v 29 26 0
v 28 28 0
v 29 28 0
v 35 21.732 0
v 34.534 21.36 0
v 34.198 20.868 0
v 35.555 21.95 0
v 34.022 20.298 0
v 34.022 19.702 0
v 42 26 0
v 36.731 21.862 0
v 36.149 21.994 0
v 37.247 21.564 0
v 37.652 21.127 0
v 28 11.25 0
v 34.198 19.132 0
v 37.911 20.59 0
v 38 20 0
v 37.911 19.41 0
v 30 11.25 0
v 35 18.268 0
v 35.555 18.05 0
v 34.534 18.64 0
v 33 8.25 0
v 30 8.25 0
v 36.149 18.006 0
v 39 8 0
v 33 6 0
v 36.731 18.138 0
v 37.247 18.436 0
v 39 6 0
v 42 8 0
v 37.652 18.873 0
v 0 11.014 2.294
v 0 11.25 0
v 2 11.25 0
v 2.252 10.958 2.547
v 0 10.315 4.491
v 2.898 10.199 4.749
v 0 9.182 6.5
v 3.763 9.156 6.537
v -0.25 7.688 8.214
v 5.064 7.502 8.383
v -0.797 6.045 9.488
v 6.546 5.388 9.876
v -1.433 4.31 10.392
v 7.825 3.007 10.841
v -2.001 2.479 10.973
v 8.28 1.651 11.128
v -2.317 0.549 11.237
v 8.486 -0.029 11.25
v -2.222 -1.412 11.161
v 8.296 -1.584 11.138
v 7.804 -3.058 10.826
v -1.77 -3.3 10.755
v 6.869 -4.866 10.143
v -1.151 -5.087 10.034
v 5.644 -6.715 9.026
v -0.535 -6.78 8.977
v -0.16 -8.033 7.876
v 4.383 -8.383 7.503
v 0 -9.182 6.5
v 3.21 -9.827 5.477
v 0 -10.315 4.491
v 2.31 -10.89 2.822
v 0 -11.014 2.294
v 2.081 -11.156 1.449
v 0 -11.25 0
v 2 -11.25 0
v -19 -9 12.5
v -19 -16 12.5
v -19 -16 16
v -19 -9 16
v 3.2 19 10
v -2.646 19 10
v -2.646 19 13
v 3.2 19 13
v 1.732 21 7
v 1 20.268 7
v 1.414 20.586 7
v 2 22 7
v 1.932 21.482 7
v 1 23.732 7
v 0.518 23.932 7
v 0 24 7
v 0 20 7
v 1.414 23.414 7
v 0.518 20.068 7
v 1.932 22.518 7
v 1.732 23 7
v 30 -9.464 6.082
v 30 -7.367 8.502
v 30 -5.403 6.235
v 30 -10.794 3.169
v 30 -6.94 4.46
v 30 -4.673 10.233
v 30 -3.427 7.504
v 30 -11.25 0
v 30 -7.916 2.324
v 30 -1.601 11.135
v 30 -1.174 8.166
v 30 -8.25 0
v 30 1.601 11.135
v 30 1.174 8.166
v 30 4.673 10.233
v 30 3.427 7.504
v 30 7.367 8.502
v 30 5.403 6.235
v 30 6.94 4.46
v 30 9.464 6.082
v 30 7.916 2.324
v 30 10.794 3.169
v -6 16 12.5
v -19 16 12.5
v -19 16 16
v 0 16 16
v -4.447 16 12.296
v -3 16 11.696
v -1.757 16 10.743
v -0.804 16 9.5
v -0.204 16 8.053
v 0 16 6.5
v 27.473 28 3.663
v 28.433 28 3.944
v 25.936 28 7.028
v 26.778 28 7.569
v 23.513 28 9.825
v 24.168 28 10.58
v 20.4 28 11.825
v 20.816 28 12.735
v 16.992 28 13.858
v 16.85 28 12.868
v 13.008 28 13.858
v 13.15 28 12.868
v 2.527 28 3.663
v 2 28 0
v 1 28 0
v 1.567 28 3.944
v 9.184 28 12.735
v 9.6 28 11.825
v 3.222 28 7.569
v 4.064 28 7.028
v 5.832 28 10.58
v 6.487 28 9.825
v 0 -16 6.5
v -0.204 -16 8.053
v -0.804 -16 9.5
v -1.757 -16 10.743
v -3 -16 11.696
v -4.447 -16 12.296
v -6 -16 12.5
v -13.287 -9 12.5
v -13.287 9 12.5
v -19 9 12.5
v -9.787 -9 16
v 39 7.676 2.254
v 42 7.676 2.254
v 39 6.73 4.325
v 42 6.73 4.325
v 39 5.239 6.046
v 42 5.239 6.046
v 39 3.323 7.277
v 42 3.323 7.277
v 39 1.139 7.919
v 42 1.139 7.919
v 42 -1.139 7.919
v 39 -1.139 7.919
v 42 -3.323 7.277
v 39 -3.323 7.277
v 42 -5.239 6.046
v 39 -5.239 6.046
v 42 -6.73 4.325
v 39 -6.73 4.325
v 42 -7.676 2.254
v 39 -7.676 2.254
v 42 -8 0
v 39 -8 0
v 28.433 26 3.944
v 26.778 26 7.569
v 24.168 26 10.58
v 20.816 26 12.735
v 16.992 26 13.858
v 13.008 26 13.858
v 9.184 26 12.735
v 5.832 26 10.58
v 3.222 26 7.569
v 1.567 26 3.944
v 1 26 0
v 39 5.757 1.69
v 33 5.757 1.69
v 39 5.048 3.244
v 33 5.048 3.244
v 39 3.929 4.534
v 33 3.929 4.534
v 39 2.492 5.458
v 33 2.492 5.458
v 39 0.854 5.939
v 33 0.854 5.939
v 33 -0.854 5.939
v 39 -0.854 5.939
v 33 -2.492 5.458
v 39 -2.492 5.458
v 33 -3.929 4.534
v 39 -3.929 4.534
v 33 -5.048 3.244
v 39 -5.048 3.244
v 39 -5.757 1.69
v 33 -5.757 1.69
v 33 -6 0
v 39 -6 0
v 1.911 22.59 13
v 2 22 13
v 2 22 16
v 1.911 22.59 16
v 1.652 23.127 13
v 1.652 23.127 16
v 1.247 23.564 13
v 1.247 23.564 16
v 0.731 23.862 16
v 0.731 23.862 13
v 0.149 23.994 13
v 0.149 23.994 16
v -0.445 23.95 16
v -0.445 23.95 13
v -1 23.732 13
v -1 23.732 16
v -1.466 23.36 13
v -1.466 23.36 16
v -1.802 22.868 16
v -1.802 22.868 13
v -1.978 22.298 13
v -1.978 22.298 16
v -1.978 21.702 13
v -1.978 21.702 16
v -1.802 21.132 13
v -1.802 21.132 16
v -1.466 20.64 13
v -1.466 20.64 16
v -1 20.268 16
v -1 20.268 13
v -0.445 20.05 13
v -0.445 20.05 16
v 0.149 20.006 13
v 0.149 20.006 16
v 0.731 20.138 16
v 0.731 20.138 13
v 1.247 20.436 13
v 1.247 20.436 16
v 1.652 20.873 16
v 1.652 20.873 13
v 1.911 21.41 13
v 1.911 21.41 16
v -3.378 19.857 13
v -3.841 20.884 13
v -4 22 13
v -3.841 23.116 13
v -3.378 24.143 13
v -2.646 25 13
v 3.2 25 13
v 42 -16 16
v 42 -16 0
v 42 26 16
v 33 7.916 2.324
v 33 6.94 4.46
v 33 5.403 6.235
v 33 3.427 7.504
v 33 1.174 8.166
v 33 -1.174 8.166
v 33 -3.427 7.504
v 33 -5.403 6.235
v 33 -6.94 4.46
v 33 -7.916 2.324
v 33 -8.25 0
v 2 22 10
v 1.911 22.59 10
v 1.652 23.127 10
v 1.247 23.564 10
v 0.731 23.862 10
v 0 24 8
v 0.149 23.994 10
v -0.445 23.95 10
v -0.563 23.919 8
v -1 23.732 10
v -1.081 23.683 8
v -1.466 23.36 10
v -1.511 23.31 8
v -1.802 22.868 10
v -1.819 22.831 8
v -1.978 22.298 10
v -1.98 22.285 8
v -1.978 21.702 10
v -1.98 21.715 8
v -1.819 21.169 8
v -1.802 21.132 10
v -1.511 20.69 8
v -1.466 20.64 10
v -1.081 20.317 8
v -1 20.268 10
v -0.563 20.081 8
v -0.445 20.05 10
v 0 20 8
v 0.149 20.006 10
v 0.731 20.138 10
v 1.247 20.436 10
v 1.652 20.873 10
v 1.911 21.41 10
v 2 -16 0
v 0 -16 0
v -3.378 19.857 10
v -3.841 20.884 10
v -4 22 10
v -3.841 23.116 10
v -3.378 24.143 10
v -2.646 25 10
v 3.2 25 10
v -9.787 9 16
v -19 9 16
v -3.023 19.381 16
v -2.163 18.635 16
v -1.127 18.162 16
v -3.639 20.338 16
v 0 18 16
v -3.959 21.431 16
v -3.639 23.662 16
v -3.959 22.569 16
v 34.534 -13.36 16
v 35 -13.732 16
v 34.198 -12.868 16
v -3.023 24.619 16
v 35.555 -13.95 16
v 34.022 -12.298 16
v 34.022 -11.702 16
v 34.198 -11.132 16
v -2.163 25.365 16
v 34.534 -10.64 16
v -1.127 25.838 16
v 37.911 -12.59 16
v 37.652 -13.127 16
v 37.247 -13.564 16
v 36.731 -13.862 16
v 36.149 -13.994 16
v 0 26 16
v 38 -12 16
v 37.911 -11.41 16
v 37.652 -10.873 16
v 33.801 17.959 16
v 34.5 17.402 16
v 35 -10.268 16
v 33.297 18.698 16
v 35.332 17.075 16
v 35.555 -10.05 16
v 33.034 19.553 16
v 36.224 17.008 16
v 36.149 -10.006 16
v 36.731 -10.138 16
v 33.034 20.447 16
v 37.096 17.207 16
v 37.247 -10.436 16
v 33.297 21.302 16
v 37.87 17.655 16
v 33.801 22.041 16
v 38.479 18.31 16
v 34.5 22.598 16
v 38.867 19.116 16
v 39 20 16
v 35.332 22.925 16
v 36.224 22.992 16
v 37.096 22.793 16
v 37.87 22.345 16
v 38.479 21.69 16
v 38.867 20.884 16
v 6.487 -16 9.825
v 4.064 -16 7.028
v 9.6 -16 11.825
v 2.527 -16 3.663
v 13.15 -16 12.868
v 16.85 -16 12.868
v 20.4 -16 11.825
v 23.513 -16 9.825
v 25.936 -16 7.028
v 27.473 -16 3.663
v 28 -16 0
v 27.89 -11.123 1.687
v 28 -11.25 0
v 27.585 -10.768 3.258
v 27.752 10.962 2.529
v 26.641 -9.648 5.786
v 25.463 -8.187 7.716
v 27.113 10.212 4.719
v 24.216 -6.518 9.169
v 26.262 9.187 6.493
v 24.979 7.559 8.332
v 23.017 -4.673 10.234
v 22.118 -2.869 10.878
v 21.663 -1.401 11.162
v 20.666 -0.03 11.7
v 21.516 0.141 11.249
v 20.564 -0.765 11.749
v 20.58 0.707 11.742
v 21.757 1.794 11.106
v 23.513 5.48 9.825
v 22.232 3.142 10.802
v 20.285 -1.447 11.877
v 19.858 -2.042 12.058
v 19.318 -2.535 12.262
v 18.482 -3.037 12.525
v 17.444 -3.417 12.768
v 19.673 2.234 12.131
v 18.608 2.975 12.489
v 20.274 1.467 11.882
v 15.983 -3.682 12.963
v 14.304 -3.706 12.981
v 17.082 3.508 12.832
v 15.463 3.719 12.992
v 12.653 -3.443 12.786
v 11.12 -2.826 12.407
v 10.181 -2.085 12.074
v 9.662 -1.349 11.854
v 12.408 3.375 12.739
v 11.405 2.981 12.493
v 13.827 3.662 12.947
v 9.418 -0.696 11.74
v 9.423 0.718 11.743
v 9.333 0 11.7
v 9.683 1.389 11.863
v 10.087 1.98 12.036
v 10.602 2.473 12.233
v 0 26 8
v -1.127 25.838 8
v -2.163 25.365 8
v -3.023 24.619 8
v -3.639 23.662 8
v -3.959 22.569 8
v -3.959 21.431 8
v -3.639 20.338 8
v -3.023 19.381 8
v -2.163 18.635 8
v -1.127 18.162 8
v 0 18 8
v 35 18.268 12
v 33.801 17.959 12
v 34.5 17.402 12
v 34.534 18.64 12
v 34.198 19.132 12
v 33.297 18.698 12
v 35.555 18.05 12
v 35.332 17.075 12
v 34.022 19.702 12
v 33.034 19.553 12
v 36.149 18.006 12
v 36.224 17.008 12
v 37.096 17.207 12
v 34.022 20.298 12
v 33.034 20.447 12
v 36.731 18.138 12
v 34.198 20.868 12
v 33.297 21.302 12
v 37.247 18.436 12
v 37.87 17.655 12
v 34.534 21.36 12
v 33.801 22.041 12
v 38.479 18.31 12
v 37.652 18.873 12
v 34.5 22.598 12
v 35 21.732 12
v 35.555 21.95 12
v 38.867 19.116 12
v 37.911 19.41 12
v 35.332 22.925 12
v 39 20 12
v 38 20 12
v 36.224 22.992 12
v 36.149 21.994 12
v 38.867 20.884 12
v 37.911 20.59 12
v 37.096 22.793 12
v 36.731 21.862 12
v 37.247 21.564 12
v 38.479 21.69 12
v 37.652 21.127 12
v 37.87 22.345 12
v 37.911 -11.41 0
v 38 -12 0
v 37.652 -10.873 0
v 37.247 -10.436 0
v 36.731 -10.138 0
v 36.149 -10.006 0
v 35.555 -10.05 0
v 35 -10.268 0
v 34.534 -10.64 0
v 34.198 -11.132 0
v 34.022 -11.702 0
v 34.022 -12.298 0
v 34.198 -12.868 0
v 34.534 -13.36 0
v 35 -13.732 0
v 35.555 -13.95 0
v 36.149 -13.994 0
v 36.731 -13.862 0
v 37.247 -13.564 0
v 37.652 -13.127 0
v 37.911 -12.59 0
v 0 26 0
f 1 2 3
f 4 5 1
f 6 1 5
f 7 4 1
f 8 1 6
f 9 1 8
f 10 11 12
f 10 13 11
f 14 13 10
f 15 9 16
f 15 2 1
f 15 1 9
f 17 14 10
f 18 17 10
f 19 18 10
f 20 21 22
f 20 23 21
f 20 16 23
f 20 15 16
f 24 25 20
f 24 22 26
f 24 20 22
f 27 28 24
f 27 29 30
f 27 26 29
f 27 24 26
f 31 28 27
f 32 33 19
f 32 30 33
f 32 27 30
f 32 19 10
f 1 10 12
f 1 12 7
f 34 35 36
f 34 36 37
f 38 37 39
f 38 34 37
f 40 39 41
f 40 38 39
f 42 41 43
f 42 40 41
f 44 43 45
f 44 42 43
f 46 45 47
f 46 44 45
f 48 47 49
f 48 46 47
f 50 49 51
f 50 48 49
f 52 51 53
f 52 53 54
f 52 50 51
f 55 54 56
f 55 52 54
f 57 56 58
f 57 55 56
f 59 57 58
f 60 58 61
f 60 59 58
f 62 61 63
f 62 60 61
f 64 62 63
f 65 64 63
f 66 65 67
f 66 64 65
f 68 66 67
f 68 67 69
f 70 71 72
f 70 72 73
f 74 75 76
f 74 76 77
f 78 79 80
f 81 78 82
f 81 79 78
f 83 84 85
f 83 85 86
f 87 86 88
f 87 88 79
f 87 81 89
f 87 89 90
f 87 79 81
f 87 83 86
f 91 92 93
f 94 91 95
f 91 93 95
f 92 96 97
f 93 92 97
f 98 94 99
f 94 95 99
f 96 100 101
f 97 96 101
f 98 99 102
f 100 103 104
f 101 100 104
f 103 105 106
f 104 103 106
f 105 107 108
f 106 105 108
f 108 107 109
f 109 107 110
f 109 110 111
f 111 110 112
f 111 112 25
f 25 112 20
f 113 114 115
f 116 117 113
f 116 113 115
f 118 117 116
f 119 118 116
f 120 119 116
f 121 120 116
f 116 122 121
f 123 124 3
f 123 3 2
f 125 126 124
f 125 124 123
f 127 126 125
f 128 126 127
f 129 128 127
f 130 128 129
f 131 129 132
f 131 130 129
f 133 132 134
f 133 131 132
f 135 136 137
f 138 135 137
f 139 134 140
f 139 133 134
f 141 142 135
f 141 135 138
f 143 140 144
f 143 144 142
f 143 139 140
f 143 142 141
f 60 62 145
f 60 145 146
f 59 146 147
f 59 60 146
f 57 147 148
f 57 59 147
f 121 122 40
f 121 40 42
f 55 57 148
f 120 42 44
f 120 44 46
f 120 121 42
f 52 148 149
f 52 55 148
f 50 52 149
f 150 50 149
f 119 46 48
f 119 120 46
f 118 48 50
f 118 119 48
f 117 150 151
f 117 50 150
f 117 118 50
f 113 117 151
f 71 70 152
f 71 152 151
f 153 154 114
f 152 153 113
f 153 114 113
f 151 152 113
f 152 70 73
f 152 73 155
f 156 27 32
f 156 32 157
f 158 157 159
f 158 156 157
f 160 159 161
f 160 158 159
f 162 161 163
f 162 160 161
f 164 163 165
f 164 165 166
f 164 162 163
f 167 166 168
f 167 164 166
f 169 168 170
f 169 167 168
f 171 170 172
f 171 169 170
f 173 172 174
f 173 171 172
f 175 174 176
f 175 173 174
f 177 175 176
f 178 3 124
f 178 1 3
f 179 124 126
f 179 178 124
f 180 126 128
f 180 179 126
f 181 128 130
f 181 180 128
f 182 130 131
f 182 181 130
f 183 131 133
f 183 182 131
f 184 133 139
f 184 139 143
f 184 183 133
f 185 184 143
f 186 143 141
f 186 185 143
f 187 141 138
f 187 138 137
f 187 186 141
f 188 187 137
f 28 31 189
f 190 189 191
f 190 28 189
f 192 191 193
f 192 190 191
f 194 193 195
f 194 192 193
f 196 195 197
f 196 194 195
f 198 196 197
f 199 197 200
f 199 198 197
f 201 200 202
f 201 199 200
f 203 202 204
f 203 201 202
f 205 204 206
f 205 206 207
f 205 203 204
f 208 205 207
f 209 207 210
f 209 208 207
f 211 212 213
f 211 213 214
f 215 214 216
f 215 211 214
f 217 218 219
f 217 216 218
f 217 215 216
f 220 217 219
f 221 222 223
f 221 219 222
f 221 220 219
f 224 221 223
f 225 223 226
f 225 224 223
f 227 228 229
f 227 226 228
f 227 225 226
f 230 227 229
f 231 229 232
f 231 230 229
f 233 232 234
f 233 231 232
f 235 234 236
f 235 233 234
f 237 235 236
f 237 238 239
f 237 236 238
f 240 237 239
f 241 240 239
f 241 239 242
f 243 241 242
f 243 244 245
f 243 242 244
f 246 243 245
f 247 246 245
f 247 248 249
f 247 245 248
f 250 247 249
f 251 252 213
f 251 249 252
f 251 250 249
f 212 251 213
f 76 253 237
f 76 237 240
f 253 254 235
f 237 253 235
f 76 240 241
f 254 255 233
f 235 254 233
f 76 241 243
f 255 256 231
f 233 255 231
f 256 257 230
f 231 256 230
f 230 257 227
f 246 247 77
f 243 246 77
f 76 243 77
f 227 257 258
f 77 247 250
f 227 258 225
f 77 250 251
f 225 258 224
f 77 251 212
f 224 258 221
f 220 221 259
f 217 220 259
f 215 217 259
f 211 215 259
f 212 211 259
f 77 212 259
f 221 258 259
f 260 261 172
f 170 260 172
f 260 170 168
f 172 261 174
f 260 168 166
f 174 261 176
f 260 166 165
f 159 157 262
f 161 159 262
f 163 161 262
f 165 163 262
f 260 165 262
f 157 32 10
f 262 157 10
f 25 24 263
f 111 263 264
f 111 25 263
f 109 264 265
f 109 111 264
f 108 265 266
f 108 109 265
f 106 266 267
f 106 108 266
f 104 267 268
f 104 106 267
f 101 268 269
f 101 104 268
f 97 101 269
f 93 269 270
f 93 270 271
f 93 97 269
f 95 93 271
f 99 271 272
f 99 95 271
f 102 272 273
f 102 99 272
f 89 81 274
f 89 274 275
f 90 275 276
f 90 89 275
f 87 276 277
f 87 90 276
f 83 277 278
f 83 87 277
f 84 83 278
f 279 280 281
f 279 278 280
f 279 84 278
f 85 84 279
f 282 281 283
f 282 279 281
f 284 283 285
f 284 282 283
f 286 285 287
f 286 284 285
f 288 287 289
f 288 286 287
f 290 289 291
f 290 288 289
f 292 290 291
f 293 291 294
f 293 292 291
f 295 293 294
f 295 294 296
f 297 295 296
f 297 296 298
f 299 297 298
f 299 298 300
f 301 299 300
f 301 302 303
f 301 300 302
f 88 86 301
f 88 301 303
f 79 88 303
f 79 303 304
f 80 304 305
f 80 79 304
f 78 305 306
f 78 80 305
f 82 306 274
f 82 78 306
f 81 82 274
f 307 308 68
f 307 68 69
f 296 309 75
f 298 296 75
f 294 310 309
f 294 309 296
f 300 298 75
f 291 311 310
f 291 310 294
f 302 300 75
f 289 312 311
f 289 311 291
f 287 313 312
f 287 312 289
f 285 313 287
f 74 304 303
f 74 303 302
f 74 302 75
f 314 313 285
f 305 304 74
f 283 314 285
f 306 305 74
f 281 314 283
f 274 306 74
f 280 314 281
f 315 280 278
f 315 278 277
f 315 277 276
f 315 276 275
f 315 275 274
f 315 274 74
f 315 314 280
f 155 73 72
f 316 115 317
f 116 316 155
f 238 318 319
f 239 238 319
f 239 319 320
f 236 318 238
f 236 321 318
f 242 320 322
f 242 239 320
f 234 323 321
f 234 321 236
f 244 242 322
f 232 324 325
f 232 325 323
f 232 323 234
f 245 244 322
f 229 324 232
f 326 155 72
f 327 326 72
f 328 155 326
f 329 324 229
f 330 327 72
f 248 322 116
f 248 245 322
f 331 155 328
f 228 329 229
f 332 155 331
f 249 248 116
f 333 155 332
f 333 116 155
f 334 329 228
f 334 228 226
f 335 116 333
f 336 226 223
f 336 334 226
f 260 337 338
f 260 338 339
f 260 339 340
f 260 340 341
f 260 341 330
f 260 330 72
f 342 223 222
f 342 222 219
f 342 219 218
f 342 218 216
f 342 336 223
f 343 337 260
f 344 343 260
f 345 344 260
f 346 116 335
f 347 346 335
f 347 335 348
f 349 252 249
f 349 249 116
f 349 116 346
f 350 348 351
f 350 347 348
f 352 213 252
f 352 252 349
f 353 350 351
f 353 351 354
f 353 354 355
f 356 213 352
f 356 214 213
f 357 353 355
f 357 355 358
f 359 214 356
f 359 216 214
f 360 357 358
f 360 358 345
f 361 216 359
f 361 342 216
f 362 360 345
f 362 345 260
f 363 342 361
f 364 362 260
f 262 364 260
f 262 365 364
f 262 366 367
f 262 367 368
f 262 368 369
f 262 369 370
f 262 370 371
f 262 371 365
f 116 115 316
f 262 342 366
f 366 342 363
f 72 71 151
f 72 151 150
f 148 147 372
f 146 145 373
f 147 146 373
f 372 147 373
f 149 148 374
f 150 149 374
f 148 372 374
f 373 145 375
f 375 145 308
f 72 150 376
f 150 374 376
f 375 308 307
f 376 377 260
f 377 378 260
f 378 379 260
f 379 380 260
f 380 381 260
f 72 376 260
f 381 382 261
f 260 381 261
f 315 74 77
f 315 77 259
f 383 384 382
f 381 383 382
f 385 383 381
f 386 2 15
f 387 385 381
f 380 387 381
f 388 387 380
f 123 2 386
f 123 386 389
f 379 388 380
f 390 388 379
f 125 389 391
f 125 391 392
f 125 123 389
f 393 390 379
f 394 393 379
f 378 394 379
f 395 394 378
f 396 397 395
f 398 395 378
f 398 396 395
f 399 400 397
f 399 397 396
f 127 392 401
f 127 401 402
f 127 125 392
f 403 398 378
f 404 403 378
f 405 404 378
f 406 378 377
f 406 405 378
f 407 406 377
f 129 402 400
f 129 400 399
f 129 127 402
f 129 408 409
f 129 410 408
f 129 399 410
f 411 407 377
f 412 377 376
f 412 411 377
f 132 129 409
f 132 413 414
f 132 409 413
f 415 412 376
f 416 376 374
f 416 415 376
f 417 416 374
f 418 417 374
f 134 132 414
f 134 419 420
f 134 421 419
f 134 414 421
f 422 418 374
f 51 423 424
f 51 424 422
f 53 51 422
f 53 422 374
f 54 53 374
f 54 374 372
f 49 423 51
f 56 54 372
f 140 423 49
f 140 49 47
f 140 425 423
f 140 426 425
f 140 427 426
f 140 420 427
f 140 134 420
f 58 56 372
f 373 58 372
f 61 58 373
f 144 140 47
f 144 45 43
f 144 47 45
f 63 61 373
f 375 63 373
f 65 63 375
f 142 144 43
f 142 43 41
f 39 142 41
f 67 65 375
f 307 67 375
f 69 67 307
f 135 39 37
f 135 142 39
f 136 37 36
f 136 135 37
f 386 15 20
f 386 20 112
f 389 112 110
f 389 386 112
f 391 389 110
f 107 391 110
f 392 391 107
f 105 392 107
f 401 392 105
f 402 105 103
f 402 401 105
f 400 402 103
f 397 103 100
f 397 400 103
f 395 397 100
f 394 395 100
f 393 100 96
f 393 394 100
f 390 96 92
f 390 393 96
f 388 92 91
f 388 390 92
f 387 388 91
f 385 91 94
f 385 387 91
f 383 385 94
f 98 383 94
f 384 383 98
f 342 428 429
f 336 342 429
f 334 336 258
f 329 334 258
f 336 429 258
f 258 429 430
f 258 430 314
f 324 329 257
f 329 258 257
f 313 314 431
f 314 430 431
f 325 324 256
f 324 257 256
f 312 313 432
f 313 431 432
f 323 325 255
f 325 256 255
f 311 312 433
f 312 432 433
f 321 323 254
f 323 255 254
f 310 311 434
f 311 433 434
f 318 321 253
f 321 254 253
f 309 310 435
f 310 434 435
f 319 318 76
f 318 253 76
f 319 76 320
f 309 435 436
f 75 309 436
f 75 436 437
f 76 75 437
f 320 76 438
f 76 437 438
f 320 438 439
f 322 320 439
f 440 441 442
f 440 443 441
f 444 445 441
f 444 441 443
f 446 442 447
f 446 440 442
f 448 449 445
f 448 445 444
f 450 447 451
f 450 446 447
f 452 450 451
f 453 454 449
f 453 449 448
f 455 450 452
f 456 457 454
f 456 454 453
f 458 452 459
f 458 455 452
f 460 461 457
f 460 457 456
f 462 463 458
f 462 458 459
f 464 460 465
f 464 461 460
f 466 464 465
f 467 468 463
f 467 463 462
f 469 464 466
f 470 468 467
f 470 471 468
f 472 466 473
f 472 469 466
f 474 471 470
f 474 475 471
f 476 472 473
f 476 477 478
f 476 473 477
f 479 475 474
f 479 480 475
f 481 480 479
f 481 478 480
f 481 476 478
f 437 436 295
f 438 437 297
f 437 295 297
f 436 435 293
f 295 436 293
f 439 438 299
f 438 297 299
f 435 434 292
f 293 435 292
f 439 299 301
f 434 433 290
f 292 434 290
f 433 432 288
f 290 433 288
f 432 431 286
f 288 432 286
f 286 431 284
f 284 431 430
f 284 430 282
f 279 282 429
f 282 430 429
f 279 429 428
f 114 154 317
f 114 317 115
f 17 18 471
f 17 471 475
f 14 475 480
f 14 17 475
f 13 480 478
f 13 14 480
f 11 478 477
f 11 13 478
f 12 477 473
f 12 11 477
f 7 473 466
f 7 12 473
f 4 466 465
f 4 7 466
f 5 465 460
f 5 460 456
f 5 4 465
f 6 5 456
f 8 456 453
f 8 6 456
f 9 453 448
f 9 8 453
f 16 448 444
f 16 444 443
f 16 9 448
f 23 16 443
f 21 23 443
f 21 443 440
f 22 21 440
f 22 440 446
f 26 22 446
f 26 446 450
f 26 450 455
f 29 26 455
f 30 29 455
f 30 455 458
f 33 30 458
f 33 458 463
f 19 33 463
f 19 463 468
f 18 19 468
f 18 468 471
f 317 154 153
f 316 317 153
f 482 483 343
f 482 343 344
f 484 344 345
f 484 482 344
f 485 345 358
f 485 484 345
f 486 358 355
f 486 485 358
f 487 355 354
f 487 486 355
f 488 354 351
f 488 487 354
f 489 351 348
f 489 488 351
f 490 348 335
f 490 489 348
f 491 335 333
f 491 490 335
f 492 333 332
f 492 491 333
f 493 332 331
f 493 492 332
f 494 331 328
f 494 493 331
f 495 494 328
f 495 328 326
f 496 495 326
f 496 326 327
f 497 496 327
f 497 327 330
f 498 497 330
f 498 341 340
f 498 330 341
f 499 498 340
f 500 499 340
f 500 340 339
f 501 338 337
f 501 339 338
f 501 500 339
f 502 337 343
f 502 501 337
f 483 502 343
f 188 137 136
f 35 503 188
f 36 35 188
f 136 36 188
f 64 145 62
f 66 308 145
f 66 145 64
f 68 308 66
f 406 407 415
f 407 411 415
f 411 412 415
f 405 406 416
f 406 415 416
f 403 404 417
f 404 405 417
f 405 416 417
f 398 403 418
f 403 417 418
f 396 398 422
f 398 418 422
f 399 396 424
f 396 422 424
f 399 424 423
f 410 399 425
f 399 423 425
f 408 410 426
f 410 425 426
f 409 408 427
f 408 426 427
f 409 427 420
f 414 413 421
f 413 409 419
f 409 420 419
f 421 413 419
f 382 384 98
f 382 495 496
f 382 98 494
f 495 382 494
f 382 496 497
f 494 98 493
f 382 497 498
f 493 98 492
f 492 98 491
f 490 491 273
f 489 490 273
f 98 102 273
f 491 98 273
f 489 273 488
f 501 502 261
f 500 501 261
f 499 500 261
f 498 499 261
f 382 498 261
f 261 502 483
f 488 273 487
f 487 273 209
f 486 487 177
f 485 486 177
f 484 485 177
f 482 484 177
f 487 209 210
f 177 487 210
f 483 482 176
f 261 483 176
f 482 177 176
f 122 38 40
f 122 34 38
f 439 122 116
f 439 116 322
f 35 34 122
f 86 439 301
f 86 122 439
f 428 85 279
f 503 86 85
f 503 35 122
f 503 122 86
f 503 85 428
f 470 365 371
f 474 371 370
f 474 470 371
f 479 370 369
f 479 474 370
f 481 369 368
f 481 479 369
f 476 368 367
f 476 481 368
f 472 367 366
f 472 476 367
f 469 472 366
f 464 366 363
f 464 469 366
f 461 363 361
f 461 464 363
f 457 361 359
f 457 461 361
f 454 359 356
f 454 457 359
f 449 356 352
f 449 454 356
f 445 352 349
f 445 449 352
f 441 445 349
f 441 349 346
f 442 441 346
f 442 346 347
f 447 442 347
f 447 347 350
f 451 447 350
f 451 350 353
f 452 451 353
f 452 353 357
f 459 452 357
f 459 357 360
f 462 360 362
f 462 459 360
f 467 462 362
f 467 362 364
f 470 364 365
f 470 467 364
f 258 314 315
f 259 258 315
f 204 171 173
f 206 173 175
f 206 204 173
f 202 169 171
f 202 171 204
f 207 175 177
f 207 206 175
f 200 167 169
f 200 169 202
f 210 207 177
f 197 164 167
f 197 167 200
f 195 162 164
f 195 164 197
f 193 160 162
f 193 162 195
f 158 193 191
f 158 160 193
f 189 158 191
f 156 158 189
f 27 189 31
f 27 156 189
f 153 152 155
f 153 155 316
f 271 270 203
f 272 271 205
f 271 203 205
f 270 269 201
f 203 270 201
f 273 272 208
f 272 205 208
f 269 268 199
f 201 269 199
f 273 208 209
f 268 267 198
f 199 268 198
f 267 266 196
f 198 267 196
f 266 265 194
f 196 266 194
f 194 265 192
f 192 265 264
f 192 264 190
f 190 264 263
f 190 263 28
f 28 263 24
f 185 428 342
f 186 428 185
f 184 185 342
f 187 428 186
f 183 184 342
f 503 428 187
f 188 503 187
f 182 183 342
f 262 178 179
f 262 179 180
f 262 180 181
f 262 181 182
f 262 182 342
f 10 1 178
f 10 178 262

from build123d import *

# Parameters (mm, degrees)
CYLINDER076_R           = 13
CYLINDER076_DEPTH       = 2.2
CYLINDER076_ROLL_ANGLE  = 90
CYLINDER075_W           = 14
CYLINDER075_H           = 2
CYLINDER075_ANGLE       = 180
CYLINDER075_ROLL_ANGLE  = 90
CYLINDER029_R           = 6
CYLINDER029_DEPTH       = 20
CYLINDER029_PITCH_ANGLE = 90
CYLINDER030_R           = 6
CYLINDER030_DEPTH       = 20
CYLINDER030_PITCH_ANGLE = 90
CYLINDER028_R           = 13
CYLINDER028_DEPTH       = 50
CYLINDER028_ROLL_ANGLE  = 90
CYLINDER027_R           = 8
CYLINDER027_DEPTH       = 3
CYLINDER027_PITCH_ANGLE = 90
CYLINDER026_R           = 6
CYLINDER026_DEPTH       = 39
CYLINDER026_PITCH_ANGLE = 90
CYLINDER025_R           = 8.25
CYLINDER025_DEPTH       = 33
CYLINDER025_PITCH_ANGLE = 90
CYLINDER024_R           = 11.25
CYLINDER024_DEPTH       = 36
CYLINDER024_PITCH_ANGLE = 90
BOX009_W                = 10
BOX009_H                = 6
BOX009_DEPTH            = 2.7
CYLINDER023_R           = 3
CYLINDER023_DEPTH       = 11
CYLINDER022_R           = 2
CYLINDER022_DEPTH       = 29
BOX008_W                = 10
BOX008_H                = 6
BOX008_DEPTH            = 2.7
CYLINDER021_R           = 3
CYLINDER021_DEPTH       = 11
CYLINDER020_R           = 2
CYLINDER020_DEPTH       = 22
BOX017_W                = 15
BOX017_H                = 6
BOX017_DEPTH            = 3
CYLINDER056_R           = 1.5
CYLINDER056_DEPTH       = 25
CYLINDER055_R           = 2
CYLINDER055_DEPTH       = 32
CYLINDER046_R           = 5
CYLINDER046_DEPTH       = 2.2
CYLINDER046_ROLL_ANGLE  = 90
BOX005_W                = 15
BOX005_H                = 18
BOX005_DEPTH            = 15
BOX005_PITCH_ANGLE      = 45
CYLINDER015_R           = 6
CYLINDER015_DEPTH       = 32
CYLINDER015_ROLL_ANGLE  = 90
BOX004_W                = 6
BOX004_H                = 32
BOX004_DEPTH            = 6
BOX003_W                = 19
BOX003_H                = 32
BOX003_DEPTH            = 3.5
BOX001_W                = 42
BOX001_H                = 42
BOX001_DEPTH            = 16
CYLINDER047_R           = 4
CYLINDER047_DEPTH       = 8


with BuildPart() as fanmuffeinner001:
    # Cylinder076 → Cylinder076 (new body)
    with BuildSketch(Plane.XY):
        Circle(CYLINDER076_R)
    extrude(amount=CYLINDER076_DEPTH)


with BuildPart() as fanmuffeinner001_1:
    # Cylinder076 roll: moved
    add(fanmuffeinner001.part.rotate(Axis((0, 0, 0), (1, 0, 0)), CYLINDER076_ROLL_ANGLE))


with BuildPart() as fanmuffeinner001_2:
    # Cylinder076 placement: moved
    add(fanmuffeinner001_1.part.moved(Location((15, 29, 0))))


with BuildPart() as fancouplering_oberschale:
    # Cylinder075 → Cylinder075 (revolve)
    with BuildSketch(Plane.XZ):
        with Locations((7, 1)):
            Rectangle(CYLINDER075_W, CYLINDER075_H)
    revolve(axis=Axis((0, 0, 0), (0, 0, 1)), revolution_arc=CYLINDER075_ANGLE)


with BuildPart() as fancouplering_oberschale_1:
    # Cylinder075 roll: moved
    add(fancouplering_oberschale.part.rotate(Axis((0, 0, 0), (1, 0, 0)), CYLINDER075_ROLL_ANGLE))


with BuildPart() as fancouplering_oberschale_2:
    # Cylinder075 placement: moved
    add(fancouplering_oberschale_1.part.moved(Location((15, 29, 0))))

    # Cut010005: cut FanMuffeInner001
    add(fanmuffeinner001_2.part, mode=Mode.SUBTRACT)


with BuildPart() as fancouplering_oberschale_3:
    # Cut010005 placement: moved
    add(fancouplering_oberschale_2.part.moved(Location((0, -1, 0))))


with BuildPart() as cylinder029:
    # Cylinder029 → Cylinder029 (new body)
    with BuildSketch(Plane.XY):
        Circle(CYLINDER029_R)
    extrude(amount=CYLINDER029_DEPTH)


with BuildPart() as cylinder029_1:
    # Cylinder029 pitch: moved
    add(cylinder029.part.rotate(Axis((0, 0, 0), (0, 1, 0)), CYLINDER029_PITCH_ANGLE))


with BuildPart() as cylinder029_2:
    # Cylinder029 placement: moved
    add(cylinder029_1.part.moved(Location((5, 0, 17.7))))


with BuildPart() as fusion019:
    # Cylinder030 → Cylinder030 (new body)
    with BuildSketch(Plane.XY):
        Circle(CYLINDER030_R)
    extrude(amount=CYLINDER030_DEPTH)


with BuildPart() as fusion019_1:
    # Cylinder030 pitch: moved
    add(fusion019.part.rotate(Axis((0, 0, 0), (0, 1, 0)), CYLINDER030_PITCH_ANGLE))


with BuildPart() as fusion019_2:
    # Cylinder030 placement: moved
    add(fusion019_1.part.moved(Location((5, 0, -17.7))))

    # Fusion019: union Cylinder029
    add(cylinder029_2.part)


with BuildPart() as cut003:
    # Cylinder028 → Cylinder028 (new body)
    with BuildSketch(Plane.XY):
        Circle(CYLINDER028_R)
    extrude(amount=CYLINDER028_DEPTH)


with BuildPart() as cut003_1:
    # Cylinder028 roll: moved
    add(cut003.part.rotate(Axis((0, 0, 0), (1, 0, 0)), CYLINDER028_ROLL_ANGLE))


with BuildPart() as cut003_2:
    # Cylinder028 placement: moved
    add(cut003_1.part.moved(Location((15, 29, 0))))

    # Cut003: cut Fusion019
    add(fusion019_2.part, mode=Mode.SUBTRACT)


with BuildPart() as cylinder027:
    # Cylinder027 → Cylinder027 (new body)
    with BuildSketch(Plane.XY):
        Circle(CYLINDER027_R)
    extrude(amount=CYLINDER027_DEPTH)


with BuildPart() as cylinder027_1:
    # Cylinder027 pitch: moved
    add(cylinder027.part.rotate(Axis((0, 0, 0), (0, 1, 0)), CYLINDER027_PITCH_ANGLE))


with BuildPart() as cylinder027_2:
    # Cylinder027 placement: moved
    add(cylinder027_1.part.moved(Location((39, 0, 0))))


with BuildPart() as cylinder026:
    # Cylinder026 → Cylinder026 (new body)
    with BuildSketch(Plane.XY):
        Circle(CYLINDER026_R)
    extrude(amount=CYLINDER026_DEPTH)


with BuildPart() as cylinder026_1:
    # Cylinder026 pitch: moved
    add(cylinder026.part.rotate(Axis((0, 0, 0), (0, 1, 0)), CYLINDER026_PITCH_ANGLE))


with BuildPart() as cylinder026_2:
    # Cylinder026 placement: moved
    add(cylinder026_1.part)


with BuildPart() as cylinder025:
    # Cylinder025 → Cylinder025 (new body)
    with BuildSketch(Plane.XY):
        Circle(CYLINDER025_R)
    extrude(amount=CYLINDER025_DEPTH)


with BuildPart() as cylinder025_1:
    # Cylinder025 pitch: moved
    add(cylinder025.part.rotate(Axis((0, 0, 0), (0, 1, 0)), CYLINDER025_PITCH_ANGLE))


with BuildPart() as cylinder025_2:
    # Cylinder025 placement: moved
    add(cylinder025_1.part)


with BuildPart() as coldendcutairflow_oberschale:
    # Cylinder024 → Cylinder024 (new body)
    with BuildSketch(Plane.XY):
        Circle(CYLINDER024_R)
    extrude(amount=CYLINDER024_DEPTH)


with BuildPart() as coldendcutairflow_oberschale_1:
    # Cylinder024 pitch: moved
    add(coldendcutairflow_oberschale.part.rotate(Axis((0, 0, 0), (0, 1, 0)), CYLINDER024_PITCH_ANGLE))


with BuildPart() as coldendcutairflow_oberschale_2:
    # Cylinder024 placement: moved
    add(coldendcutairflow_oberschale_1.part.moved(Location((-6, 0, 0))))

    # Fusion020: union Cut003, Cylinder027, Cylinder026, Cylinder025
    add(cut003_2.part)
    add(cylinder027_2.part)
    add(cylinder026_2.part)
    add(cylinder025_2.part)


with BuildPart() as cube006:
    # Box009 → Box009 (new body)
    with BuildSketch(Plane(origin=(41.8, 14, -7.5), x_dir=(1, 0, 0), z_dir=(0, 0, 1))):
        with Locations((5, 3)):
            Rectangle(BOX009_W, BOX009_H)
    extrude(amount=BOX009_DEPTH)


with BuildPart() as cylinder023:
    # Cylinder023 → Cylinder023 (new body)
    with BuildSketch(Plane(origin=(45, 21, -6), x_dir=(1, 0, 0), z_dir=(0, 0, 1))):
        Circle(CYLINDER023_R)
    extrude(amount=CYLINDER023_DEPTH)


with BuildPart() as fusion017:
    # Cylinder022 → Cylinder022 (new body)
    with BuildSketch(Plane(origin=(45, 21, -34), x_dir=(1, 0, 0), z_dir=(0, 0, 1))):
        Circle(CYLINDER022_R)
    extrude(amount=CYLINDER022_DEPTH)

    # Fusion016: union Cylinder023
    add(cylinder023.part)


with BuildPart() as fusion017_1:
    # Fusion016 placement: moved
    add(fusion017.part.moved(Location((0, -4, 24))))

    # Fusion017: union Cube006
    add(cube006.part)


with BuildPart() as fusion017_2:
    # Fusion017 placement: moved
    add(fusion017_1.part.moved(Location((-9, -29, 0))))


with BuildPart() as cube005:
    # Box008 → Box008 (new body)
    with BuildSketch(Plane(origin=(41.8, 14, -7.5), x_dir=(1, 0, 0), z_dir=(0, 0, 1))):
        with Locations((5, 3)):
            Rectangle(BOX008_W, BOX008_H)
    extrude(amount=BOX008_DEPTH)


with BuildPart() as cylinder021:
    # Cylinder021 → Cylinder021 (new body)
    with BuildSketch(Plane(origin=(45, 21, -12), x_dir=(1, 0, 0), z_dir=(0, 0, 1))):
        Circle(CYLINDER021_R)
    extrude(amount=CYLINDER021_DEPTH)


with BuildPart() as schalenbohrung_oberschale:
    # Cylinder020 → Cylinder020 (new body)
    with BuildSketch(Plane(origin=(45, 21, -34), x_dir=(1, 0, 0), z_dir=(0, 0, 1))):
        Circle(CYLINDER020_R)
    extrude(amount=CYLINDER020_DEPTH)

    # Fusion014: union Cylinder021
    add(cylinder021.part)


with BuildPart() as schalenbohrung_oberschale_1:
    # Fusion014 placement: moved
    add(schalenbohrung_oberschale.part.moved(Location((0, -4, 24))))

    # Fusion015: union Cube005
    add(cube005.part)


with BuildPart() as schalenbohrung_oberschale_2:
    # Fusion015 placement: moved
    add(schalenbohrung_oberschale_1.part.moved(Location((-9, 3, 0))))

    # Fusion018: union Fusion017
    add(fusion017_2.part)


with BuildPart() as cube014:
    # Box017 → Box017 (new body)
    with BuildSketch(Plane(origin=(58.2, 67, 3), x_dir=(1, 0, 0), z_dir=(0, 0, 1))):
        with Locations((7.5, 3)):
            Rectangle(BOX017_W, BOX017_H)
    extrude(amount=BOX017_DEPTH)


with BuildPart() as cylinder056:
    # Cylinder056 → Cylinder056 (new body)
    with BuildSketch(Plane(origin=(70, 70, 7), x_dir=(1, 0, 0), z_dir=(0, 0, 1))):
        Circle(CYLINDER056_R)
    extrude(amount=CYLINDER056_DEPTH)


with BuildPart() as bohrungafanduct_oberschale:
    # Cylinder055 → Cylinder055 (new body)
    with BuildSketch(Plane(origin=(70, 70, 0), x_dir=(1, 0, 0), z_dir=(0, 0, 1))):
        Circle(CYLINDER055_R)
    extrude(amount=CYLINDER055_DEPTH)

    # Fusion040: union Cube014, Cylinder056
    add(cube014.part)
    add(cylinder056.part)


with BuildPart() as bohrungafanduct_oberschale_1:
    # Fusion040 placement: moved
    add(bohrungafanduct_oberschale.part.moved(Location((-70, -48, 7))))


with BuildPart() as bohrungoberschale:
    # Cylinder046 → Cylinder046 (new body)
    with BuildSketch(Plane.XY):
        Circle(CYLINDER046_R)
    extrude(amount=CYLINDER046_DEPTH)


with BuildPart() as bohrungoberschale_1:
    # Cylinder046 roll: moved
    add(bohrungoberschale.part.rotate(Axis((0, 0, 0), (1, 0, 0)), CYLINDER046_ROLL_ANGLE))


with BuildPart() as bohrungoberschale_2:
    # Cylinder046 placement: moved
    add(bohrungoberschale_1.part.moved(Location((15, 26, 0))))

    # Fusion052: union ColdendCutAirFlow_OberSchale, SchalenBohrung_OberSchale, BohrungAFanDuct_OberSchale
    add(coldendcutairflow_oberschale_2.part)
    add(schalenbohrung_oberschale_2.part)
    add(bohrungafanduct_oberschale_1.part)


with BuildPart() as cube002:
    # Box005 → Box005 (new body)
    with BuildSketch(Plane.XY):
        with Locations((7.5, 9)):
            Rectangle(BOX005_W, BOX005_H)
    extrude(amount=BOX005_DEPTH)


with BuildPart() as cube002_1:
    # Box005 pitch: moved
    add(cube002.part.rotate(Axis((0, 0, 0), (0, 1, 0)), BOX005_PITCH_ANGLE))


with BuildPart() as cube002_2:
    # Box005 placement: moved
    add(cube002_1.part.moved(Location((-30, -9, 17))))


with BuildPart() as cylinder015:
    # Cylinder015 → Cylinder015 (new body)
    with BuildSketch(Plane.XY):
        Circle(CYLINDER015_R)
    extrude(amount=CYLINDER015_DEPTH)


with BuildPart() as cylinder015_1:
    # Cylinder015 roll: moved
    add(cylinder015.part.rotate(Axis((0, 0, 0), (1, 0, 0)), CYLINDER015_ROLL_ANGLE))


with BuildPart() as cylinder015_2:
    # Cylinder015 placement: moved
    add(cylinder015_1.part.moved(Location((-6, 16, 6.5))))


with BuildPart() as cut001:
    # Box004 → Box004 (new body)
    with BuildSketch(Plane(origin=(-6, -16, 6.5), x_dir=(1, 0, 0), z_dir=(0, 0, 1))):
        with Locations((3, 16)):
            Rectangle(BOX004_W, BOX004_H)
    extrude(amount=BOX004_DEPTH)

    # Cut001: cut Cylinder015
    add(cylinder015_2.part, mode=Mode.SUBTRACT)


with BuildPart() as cut002:
    # Box003 → Box003 (new body)
    with BuildSketch(Plane(origin=(-19, -16, 12.5), x_dir=(1, 0, 0), z_dir=(0, 0, 1))):
        with Locations((9.5, 16)):
            Rectangle(BOX003_W, BOX003_H)
    extrude(amount=BOX003_DEPTH)

    # Fusion007: union Cut001
    add(cut001.part)

    # Cut002: cut Cube002
    add(cube002_2.part, mode=Mode.SUBTRACT)


with BuildPart() as fusion008:
    # Box001 → Box001 (new body)
    with BuildSketch(Plane(origin=(0, -16, 0), x_dir=(1, 0, 0), z_dir=(0, 0, 1))):
        with Locations((21, 21)):
            Rectangle(BOX001_W, BOX001_H)
    extrude(amount=BOX001_DEPTH)

    # Fusion008: union Cut002
    add(cut002.part)


with BuildPart() as oberschale:
    # Cylinder047 → Cylinder047 (new body)
    with BuildSketch(Plane(origin=(0, 22, 8), x_dir=(1, 0, 0), z_dir=(0, 0, 1))):
        Circle(CYLINDER047_R)
    extrude(amount=CYLINDER047_DEPTH)

    # Fusion049: union Fusion008
    add(fusion008.part)

    # Cut010: cut BohrungOberSchale
    add(bohrungoberschale_2.part, mode=Mode.SUBTRACT)

    # Fusion058: union FanCoupleRing_OberSchale
    add(fancouplering_oberschale_3.part)


solid = oberschale.part
